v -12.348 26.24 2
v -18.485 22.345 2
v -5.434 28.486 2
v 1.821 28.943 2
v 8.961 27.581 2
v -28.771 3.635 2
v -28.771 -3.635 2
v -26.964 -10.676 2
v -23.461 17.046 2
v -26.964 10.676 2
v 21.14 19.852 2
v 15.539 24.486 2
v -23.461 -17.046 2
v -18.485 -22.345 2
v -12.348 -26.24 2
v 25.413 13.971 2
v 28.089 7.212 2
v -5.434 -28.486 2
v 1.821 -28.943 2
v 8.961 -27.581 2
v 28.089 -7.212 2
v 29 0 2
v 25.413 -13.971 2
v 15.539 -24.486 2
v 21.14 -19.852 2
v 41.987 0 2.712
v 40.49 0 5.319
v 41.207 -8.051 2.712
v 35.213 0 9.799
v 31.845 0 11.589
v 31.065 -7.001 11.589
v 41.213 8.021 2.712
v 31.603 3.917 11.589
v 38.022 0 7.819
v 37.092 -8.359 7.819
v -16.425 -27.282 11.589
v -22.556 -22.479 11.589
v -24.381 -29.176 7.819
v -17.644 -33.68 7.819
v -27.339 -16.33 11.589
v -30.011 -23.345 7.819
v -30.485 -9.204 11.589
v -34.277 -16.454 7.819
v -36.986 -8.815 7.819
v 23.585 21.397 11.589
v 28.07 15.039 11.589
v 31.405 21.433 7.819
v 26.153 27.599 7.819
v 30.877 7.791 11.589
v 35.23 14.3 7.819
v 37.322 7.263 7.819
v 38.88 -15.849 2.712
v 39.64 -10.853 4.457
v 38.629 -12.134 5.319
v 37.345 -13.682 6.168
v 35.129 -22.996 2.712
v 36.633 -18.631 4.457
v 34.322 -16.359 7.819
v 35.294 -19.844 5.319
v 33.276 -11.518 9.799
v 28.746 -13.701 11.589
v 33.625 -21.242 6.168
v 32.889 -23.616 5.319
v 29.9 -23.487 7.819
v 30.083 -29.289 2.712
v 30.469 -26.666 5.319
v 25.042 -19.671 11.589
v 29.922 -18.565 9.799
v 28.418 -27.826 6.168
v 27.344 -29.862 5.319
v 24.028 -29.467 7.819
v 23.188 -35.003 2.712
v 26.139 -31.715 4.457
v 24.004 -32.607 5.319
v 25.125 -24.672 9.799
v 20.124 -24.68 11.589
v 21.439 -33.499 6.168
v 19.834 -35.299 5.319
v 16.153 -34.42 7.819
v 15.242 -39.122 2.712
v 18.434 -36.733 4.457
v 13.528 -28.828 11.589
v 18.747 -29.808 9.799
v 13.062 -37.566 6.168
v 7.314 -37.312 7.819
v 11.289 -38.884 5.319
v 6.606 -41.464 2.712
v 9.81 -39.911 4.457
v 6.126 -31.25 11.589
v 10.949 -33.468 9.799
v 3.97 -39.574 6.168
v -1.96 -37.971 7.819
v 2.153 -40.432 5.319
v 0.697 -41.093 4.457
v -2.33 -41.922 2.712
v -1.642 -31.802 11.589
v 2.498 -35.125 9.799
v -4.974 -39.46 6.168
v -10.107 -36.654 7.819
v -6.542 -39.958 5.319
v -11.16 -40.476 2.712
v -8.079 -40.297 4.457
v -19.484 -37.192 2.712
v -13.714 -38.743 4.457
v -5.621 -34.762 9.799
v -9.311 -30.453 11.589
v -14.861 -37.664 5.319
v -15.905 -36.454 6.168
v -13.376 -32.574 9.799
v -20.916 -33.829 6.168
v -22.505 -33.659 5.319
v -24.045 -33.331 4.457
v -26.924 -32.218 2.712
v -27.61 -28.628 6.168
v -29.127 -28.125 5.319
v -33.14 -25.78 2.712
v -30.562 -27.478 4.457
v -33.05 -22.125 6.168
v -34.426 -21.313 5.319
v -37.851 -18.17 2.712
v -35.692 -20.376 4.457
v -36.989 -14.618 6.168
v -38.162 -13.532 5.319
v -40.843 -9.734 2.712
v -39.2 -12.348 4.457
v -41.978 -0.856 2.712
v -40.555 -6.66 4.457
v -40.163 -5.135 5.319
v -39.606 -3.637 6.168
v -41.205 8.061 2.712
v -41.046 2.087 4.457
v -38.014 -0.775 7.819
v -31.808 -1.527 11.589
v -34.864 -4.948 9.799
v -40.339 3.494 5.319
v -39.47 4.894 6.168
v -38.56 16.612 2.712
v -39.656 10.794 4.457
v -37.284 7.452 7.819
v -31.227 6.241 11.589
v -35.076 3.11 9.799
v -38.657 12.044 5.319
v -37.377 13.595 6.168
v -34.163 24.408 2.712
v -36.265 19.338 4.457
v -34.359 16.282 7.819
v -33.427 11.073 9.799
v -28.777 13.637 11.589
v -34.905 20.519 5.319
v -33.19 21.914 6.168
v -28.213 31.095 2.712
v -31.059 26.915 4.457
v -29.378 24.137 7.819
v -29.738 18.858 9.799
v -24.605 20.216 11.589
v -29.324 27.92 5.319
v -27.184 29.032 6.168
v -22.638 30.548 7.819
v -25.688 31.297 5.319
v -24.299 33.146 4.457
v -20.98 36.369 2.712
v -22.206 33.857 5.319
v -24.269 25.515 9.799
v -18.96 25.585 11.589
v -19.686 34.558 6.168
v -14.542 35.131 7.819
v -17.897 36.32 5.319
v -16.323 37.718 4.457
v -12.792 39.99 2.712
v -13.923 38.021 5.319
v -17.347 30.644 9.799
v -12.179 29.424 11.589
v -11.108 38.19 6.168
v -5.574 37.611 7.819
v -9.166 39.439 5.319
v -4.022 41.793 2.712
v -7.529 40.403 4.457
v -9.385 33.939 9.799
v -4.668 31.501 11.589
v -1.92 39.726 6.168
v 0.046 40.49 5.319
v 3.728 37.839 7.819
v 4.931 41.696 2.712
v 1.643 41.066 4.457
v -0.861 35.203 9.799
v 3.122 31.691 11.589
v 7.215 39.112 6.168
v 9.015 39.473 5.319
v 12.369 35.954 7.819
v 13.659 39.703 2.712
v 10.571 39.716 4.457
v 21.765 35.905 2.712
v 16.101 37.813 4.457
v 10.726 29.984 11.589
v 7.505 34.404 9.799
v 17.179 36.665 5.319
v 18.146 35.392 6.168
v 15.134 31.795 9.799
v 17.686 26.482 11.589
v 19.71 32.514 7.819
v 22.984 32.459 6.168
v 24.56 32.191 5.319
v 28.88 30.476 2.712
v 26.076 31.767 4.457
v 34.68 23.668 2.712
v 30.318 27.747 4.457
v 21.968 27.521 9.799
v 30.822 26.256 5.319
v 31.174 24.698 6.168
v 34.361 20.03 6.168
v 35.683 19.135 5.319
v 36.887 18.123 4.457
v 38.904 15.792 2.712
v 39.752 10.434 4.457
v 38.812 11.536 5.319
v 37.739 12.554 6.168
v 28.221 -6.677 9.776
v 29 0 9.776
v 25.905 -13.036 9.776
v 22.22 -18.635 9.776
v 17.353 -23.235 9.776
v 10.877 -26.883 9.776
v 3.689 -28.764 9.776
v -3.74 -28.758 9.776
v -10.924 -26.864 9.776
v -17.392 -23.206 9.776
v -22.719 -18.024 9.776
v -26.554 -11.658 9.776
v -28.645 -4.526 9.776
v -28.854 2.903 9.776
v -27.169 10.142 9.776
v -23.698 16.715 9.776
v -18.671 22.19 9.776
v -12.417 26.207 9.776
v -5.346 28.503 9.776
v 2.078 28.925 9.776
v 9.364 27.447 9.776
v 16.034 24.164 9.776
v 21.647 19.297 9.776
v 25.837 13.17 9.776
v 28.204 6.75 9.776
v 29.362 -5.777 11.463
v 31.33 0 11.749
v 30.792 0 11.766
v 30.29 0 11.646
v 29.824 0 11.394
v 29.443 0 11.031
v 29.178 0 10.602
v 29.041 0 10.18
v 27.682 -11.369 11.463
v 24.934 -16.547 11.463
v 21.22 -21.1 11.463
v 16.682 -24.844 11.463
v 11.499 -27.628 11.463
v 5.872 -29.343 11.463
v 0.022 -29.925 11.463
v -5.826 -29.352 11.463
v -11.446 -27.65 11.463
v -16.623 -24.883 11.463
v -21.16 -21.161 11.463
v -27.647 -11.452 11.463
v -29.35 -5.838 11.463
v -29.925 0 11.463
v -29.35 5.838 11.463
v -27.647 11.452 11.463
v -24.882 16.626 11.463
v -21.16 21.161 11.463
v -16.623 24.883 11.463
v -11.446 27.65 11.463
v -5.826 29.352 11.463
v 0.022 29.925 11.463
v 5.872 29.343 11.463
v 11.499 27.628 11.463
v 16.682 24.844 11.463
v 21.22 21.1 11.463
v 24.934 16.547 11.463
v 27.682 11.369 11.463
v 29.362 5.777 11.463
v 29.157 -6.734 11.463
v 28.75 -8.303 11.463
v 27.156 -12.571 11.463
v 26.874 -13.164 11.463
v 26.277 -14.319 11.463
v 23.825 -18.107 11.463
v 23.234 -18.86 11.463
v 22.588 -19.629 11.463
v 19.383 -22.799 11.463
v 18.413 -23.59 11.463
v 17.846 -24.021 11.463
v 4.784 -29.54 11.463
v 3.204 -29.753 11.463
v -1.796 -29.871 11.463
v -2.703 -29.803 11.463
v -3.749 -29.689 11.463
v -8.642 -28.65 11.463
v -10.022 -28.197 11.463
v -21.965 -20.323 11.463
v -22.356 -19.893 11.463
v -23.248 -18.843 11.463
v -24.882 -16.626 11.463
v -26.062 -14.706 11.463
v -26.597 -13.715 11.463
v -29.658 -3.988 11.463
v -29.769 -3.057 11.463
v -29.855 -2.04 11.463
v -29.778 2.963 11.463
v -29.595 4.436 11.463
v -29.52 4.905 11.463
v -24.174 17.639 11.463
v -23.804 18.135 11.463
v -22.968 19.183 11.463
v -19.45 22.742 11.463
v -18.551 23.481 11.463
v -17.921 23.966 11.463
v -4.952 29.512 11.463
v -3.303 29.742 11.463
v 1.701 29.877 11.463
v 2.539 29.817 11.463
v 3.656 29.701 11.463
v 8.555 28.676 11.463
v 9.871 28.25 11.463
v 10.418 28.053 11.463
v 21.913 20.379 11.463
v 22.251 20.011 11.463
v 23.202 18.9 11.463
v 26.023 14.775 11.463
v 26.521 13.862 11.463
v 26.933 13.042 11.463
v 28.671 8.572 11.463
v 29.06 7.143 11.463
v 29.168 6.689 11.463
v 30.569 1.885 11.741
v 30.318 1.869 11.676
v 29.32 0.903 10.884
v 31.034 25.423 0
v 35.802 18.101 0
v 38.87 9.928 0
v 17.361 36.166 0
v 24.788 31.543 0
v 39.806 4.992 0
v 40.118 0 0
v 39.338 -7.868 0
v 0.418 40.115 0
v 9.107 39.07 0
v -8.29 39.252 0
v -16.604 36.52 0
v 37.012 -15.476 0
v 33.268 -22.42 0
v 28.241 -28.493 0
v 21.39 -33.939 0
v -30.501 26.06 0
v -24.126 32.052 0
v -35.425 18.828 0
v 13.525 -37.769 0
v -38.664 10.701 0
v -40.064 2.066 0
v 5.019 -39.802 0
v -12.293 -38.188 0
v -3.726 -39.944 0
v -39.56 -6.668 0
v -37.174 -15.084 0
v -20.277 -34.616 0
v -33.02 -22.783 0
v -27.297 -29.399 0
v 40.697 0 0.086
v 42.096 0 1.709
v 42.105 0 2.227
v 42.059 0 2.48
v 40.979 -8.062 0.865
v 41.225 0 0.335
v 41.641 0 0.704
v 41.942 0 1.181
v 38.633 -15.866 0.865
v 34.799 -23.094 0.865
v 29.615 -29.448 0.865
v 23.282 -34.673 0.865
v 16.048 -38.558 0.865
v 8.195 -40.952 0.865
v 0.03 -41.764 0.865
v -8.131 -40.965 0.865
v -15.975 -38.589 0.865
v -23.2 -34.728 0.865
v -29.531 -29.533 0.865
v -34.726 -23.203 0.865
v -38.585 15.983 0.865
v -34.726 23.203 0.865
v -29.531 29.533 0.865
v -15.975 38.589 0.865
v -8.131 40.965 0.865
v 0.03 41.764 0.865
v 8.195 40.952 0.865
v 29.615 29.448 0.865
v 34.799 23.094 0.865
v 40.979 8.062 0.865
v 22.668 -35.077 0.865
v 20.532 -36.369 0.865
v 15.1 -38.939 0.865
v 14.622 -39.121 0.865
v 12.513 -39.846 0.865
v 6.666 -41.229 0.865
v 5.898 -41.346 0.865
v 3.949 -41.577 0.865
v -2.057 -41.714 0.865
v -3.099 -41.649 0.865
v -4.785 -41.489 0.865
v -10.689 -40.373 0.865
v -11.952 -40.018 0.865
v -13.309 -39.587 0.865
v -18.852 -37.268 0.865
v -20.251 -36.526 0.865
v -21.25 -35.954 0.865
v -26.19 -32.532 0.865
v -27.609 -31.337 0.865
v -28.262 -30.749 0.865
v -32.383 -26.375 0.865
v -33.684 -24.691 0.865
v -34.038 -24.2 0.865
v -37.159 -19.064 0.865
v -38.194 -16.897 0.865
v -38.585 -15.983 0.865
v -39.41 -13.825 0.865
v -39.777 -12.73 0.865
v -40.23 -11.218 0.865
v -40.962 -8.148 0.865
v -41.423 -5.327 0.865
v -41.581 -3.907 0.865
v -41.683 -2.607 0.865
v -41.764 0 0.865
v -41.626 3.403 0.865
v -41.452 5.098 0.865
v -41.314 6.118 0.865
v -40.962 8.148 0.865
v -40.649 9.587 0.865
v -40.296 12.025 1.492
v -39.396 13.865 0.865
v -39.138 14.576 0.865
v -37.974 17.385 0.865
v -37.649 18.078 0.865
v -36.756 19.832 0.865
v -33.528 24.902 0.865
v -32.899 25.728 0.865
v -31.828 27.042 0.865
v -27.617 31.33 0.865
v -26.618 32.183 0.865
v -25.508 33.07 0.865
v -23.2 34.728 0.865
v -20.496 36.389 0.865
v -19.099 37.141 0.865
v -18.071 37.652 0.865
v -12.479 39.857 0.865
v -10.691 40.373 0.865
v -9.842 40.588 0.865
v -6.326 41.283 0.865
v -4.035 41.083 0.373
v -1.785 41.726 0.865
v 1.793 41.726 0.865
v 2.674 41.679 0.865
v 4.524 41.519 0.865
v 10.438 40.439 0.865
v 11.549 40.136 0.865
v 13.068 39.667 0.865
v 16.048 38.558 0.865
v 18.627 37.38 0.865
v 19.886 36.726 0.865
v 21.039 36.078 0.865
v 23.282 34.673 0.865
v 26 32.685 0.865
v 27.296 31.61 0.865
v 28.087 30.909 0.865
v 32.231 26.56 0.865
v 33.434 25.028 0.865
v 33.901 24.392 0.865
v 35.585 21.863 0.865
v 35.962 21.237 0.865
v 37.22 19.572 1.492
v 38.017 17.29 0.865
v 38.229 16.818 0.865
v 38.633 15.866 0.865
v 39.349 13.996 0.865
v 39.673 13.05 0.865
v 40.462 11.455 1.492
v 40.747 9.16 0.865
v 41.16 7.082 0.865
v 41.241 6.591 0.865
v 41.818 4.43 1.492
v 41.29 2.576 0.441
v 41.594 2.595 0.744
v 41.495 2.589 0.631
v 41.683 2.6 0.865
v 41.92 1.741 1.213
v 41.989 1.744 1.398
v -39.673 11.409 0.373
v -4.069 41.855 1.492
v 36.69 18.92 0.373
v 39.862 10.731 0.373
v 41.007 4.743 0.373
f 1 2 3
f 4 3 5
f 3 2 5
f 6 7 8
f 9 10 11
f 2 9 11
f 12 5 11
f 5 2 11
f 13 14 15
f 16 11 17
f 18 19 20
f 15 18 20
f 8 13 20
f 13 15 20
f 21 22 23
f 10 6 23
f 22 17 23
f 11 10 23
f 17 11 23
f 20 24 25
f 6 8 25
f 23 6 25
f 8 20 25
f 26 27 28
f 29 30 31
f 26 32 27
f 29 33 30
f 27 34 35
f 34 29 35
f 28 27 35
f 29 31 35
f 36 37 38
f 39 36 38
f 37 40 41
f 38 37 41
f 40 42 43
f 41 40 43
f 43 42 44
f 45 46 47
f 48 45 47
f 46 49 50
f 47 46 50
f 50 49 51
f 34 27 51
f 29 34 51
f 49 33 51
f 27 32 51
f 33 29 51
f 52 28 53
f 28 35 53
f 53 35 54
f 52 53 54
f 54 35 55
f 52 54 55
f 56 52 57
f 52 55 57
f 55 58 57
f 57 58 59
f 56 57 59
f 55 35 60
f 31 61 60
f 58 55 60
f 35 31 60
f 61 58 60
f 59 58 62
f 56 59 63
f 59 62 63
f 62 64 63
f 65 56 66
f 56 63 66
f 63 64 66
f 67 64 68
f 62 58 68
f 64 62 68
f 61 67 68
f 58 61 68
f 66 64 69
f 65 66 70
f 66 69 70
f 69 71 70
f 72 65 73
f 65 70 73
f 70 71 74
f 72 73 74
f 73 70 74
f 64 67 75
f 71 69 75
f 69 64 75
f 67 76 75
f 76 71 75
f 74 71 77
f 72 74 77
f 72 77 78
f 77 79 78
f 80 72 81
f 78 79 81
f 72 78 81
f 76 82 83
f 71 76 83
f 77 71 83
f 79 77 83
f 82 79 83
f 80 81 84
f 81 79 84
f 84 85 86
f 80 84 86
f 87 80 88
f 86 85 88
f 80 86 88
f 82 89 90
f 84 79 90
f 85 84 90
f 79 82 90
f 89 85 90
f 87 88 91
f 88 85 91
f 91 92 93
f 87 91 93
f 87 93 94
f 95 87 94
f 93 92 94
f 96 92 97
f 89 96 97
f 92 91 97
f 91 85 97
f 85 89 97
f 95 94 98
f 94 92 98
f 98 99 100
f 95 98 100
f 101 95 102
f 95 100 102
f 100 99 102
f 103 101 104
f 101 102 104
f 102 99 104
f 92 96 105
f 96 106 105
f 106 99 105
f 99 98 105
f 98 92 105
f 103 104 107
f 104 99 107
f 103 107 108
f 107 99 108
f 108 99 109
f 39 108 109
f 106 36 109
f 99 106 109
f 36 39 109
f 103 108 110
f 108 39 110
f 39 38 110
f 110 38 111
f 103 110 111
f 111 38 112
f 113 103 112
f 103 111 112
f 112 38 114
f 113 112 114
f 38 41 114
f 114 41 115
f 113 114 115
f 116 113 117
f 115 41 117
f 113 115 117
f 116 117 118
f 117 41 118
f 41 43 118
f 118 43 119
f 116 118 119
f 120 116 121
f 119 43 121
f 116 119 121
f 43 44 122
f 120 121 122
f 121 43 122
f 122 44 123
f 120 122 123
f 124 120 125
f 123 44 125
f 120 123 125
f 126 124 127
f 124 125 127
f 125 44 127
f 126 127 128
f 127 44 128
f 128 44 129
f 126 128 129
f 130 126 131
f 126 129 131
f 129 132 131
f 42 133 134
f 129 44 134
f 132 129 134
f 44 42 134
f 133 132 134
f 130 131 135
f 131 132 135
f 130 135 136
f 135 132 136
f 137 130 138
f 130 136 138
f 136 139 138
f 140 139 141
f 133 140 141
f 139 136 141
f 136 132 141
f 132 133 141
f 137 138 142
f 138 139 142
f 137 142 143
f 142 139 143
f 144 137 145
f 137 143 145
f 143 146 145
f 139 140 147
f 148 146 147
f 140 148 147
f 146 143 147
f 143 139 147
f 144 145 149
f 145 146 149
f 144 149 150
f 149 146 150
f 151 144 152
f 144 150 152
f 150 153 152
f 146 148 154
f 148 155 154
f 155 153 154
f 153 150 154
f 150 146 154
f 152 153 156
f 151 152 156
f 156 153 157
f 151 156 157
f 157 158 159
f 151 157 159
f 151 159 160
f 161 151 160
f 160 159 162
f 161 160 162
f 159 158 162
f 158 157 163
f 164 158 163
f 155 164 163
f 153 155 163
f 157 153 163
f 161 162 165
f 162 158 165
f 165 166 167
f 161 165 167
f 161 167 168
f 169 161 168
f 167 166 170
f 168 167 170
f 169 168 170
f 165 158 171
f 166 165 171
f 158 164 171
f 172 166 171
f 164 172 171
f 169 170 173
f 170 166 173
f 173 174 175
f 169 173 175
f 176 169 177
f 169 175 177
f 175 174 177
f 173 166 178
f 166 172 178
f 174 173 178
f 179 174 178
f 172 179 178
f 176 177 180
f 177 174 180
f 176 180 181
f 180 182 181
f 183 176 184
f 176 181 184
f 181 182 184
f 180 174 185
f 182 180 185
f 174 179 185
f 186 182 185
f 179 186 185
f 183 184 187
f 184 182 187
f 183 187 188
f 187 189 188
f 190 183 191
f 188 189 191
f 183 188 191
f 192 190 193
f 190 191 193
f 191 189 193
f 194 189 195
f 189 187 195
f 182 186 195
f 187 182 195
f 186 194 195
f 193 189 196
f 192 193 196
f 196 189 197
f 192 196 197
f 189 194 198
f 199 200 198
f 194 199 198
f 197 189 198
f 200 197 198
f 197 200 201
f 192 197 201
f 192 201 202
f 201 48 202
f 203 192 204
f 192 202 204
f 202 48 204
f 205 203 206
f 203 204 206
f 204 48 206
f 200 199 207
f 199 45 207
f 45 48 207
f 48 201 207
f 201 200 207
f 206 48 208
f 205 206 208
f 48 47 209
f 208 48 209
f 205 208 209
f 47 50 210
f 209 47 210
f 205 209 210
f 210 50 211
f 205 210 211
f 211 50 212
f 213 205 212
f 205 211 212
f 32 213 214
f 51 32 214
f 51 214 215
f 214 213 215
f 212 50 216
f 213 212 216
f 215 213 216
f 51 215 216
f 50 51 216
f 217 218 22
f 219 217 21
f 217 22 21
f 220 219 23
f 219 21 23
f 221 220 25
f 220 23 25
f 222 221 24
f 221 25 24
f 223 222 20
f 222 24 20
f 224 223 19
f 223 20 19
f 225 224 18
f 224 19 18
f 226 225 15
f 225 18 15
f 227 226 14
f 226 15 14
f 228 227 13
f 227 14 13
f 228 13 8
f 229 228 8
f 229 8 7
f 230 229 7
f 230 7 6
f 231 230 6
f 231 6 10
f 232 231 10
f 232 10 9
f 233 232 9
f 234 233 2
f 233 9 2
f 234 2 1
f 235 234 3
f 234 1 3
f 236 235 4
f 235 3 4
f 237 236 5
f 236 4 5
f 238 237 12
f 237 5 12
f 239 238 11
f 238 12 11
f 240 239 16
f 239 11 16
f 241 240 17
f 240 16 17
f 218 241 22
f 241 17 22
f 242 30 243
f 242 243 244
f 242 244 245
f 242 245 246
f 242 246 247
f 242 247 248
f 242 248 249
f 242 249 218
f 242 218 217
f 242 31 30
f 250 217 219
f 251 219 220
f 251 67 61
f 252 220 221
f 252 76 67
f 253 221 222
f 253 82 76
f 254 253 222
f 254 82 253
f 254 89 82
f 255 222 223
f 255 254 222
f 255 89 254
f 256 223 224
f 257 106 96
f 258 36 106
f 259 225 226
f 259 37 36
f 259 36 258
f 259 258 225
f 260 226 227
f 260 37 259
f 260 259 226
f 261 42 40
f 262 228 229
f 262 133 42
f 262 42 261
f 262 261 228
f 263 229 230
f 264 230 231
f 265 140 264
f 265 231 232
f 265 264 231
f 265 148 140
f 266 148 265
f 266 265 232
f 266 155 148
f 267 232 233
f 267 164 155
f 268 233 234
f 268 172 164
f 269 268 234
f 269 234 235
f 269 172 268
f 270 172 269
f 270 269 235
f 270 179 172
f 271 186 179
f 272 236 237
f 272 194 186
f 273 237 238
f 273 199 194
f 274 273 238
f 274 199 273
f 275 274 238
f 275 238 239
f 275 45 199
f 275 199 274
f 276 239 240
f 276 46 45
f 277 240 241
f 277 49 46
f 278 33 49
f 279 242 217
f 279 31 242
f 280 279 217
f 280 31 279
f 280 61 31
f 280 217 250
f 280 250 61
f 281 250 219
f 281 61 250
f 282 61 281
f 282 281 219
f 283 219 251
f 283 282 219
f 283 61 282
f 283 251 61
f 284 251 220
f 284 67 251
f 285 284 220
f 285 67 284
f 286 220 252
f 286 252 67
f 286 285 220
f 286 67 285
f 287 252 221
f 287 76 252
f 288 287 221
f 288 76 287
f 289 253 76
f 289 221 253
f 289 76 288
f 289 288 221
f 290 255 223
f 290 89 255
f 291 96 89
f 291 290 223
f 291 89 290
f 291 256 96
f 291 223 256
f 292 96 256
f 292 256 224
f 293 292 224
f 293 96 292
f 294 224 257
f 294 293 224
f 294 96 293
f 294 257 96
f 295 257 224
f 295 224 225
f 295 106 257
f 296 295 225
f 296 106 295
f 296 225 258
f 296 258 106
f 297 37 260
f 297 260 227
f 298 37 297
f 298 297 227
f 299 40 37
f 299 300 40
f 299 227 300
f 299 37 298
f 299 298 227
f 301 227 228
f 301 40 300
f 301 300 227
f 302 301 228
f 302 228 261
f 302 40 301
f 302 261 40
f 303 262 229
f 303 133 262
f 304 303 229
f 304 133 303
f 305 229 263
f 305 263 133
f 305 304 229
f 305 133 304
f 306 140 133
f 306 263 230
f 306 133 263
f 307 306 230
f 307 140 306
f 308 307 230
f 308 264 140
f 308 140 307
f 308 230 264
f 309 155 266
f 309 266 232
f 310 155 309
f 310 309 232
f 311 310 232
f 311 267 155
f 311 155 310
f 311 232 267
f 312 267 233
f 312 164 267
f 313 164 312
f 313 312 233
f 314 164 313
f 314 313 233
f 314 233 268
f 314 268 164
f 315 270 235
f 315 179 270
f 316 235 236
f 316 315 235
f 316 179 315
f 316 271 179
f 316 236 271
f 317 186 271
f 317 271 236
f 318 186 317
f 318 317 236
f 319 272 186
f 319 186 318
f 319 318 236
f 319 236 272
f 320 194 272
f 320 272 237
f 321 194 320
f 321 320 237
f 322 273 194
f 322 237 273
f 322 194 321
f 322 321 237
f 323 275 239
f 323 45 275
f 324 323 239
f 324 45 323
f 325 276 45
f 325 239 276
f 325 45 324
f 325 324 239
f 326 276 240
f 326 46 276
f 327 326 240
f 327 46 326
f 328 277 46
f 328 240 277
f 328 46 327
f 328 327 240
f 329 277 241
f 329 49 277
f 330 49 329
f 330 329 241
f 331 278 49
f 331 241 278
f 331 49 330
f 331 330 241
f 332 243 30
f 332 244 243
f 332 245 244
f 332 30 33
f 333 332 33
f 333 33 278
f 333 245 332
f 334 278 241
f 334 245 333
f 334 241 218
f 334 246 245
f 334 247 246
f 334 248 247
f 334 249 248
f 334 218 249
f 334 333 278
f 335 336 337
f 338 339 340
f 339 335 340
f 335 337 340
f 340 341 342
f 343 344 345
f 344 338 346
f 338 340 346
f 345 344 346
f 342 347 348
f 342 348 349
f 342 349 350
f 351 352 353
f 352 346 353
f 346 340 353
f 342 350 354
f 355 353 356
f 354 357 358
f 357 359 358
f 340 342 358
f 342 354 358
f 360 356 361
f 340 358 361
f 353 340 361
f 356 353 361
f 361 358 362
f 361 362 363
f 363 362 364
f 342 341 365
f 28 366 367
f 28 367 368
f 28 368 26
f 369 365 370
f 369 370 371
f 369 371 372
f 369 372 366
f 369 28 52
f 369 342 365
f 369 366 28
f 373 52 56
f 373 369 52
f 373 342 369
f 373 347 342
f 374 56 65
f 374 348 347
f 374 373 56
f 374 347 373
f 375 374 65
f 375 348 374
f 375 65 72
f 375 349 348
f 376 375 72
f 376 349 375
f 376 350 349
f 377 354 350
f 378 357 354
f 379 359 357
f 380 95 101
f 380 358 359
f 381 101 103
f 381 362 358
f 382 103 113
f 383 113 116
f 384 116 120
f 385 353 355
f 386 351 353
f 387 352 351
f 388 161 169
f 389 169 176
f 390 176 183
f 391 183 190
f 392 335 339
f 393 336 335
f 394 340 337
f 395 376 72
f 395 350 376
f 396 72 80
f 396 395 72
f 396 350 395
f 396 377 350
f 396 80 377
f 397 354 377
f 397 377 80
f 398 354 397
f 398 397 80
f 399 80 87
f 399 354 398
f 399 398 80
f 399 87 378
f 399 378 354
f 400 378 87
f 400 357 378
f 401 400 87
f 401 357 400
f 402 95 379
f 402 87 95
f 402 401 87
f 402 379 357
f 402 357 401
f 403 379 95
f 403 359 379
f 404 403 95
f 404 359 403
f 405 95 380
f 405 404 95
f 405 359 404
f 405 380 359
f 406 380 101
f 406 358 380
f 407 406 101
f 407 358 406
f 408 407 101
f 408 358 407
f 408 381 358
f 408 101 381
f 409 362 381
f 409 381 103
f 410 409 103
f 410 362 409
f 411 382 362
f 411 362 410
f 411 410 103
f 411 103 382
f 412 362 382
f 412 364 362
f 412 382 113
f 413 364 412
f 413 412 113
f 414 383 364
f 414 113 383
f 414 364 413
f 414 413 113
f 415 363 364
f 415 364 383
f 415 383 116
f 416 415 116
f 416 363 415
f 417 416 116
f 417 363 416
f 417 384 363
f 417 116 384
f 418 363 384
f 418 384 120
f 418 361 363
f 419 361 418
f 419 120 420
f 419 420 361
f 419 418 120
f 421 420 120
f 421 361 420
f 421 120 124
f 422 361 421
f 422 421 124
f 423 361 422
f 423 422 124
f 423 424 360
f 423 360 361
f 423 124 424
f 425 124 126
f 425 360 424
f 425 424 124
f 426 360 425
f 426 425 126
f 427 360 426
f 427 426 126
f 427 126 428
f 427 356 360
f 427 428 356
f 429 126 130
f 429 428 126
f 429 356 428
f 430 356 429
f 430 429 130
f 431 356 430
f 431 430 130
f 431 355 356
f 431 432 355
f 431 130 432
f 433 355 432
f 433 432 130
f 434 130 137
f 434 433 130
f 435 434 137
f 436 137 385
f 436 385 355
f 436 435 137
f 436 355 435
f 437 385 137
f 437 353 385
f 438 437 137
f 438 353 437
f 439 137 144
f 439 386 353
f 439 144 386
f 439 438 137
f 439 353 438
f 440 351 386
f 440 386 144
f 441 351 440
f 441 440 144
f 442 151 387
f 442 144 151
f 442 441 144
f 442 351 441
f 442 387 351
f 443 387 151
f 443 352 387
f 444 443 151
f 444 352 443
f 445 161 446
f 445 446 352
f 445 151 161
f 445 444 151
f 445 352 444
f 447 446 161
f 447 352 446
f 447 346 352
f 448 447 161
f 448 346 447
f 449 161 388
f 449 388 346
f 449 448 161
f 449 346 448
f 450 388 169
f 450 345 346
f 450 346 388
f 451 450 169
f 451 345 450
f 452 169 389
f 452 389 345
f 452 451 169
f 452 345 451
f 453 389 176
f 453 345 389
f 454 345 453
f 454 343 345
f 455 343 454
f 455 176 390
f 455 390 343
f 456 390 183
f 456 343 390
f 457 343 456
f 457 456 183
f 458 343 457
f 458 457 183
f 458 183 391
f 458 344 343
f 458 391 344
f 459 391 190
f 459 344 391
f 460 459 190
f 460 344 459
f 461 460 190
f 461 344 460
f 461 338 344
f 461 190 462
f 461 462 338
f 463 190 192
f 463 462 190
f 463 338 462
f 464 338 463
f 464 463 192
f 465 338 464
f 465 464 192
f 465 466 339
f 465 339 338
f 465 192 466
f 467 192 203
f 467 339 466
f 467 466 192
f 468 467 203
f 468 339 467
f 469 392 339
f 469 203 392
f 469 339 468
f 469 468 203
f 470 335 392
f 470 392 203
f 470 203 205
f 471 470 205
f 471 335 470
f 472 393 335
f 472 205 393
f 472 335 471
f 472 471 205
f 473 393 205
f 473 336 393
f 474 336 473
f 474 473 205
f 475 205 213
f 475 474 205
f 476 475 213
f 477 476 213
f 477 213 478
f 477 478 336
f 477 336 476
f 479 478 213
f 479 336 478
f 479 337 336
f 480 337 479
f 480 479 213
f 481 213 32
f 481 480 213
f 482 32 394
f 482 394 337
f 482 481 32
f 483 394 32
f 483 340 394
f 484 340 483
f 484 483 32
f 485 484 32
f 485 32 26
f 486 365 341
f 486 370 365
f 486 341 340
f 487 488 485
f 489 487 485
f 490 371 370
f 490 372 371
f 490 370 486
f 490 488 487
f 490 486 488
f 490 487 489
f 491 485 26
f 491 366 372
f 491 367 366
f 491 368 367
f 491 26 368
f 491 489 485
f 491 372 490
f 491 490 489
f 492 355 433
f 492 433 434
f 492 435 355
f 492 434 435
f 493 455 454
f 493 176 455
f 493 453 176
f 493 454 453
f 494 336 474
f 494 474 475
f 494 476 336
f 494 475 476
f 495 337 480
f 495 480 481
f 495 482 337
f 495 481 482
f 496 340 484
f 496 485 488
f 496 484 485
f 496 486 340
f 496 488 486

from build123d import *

# Parameters (mm, degrees)
F2_R = 2
F3_R = 2


with BuildPart() as f1:
    # F0 (on Front) → F1 (revolve)
    with BuildSketch(Plane.XZ):
        with BuildLine():
            Line((0, 0), (42.5, 0))
            add(Edge.make_bspline(
                [(42.5, 0), (42.5, 7.604171656), (29, 12.7929005506)],
                knots=[3.1415926536, 3.1415926536, 3.1415926536, 3.9614124639, 3.9614124639, 3.9614124639], degree=2, weights=[1, 0.9171567317, 1]))
            Line((29, 12.7929005506), (29, 2))
            Line((29, 2), (0, 2))
            Line((0, 2), (0, 0))
        make_face()
    revolve(axis=Axis((0, 0, 1), (0, 0, -1)))

    # F2
    f2_edges = [f1.edges().sort_by_distance(p)[0] for p in [
        (-42.5, 0, 0),
    ]]
    fillet(f2_edges, radius=F2_R)

    # F3
    f3_edges = [f1.edges().sort_by_distance(p)[0] for p in [
        (-29, 0, 12.792901),
    ]]
    fillet(f3_edges, radius=F3_R)


solid = f1.part
